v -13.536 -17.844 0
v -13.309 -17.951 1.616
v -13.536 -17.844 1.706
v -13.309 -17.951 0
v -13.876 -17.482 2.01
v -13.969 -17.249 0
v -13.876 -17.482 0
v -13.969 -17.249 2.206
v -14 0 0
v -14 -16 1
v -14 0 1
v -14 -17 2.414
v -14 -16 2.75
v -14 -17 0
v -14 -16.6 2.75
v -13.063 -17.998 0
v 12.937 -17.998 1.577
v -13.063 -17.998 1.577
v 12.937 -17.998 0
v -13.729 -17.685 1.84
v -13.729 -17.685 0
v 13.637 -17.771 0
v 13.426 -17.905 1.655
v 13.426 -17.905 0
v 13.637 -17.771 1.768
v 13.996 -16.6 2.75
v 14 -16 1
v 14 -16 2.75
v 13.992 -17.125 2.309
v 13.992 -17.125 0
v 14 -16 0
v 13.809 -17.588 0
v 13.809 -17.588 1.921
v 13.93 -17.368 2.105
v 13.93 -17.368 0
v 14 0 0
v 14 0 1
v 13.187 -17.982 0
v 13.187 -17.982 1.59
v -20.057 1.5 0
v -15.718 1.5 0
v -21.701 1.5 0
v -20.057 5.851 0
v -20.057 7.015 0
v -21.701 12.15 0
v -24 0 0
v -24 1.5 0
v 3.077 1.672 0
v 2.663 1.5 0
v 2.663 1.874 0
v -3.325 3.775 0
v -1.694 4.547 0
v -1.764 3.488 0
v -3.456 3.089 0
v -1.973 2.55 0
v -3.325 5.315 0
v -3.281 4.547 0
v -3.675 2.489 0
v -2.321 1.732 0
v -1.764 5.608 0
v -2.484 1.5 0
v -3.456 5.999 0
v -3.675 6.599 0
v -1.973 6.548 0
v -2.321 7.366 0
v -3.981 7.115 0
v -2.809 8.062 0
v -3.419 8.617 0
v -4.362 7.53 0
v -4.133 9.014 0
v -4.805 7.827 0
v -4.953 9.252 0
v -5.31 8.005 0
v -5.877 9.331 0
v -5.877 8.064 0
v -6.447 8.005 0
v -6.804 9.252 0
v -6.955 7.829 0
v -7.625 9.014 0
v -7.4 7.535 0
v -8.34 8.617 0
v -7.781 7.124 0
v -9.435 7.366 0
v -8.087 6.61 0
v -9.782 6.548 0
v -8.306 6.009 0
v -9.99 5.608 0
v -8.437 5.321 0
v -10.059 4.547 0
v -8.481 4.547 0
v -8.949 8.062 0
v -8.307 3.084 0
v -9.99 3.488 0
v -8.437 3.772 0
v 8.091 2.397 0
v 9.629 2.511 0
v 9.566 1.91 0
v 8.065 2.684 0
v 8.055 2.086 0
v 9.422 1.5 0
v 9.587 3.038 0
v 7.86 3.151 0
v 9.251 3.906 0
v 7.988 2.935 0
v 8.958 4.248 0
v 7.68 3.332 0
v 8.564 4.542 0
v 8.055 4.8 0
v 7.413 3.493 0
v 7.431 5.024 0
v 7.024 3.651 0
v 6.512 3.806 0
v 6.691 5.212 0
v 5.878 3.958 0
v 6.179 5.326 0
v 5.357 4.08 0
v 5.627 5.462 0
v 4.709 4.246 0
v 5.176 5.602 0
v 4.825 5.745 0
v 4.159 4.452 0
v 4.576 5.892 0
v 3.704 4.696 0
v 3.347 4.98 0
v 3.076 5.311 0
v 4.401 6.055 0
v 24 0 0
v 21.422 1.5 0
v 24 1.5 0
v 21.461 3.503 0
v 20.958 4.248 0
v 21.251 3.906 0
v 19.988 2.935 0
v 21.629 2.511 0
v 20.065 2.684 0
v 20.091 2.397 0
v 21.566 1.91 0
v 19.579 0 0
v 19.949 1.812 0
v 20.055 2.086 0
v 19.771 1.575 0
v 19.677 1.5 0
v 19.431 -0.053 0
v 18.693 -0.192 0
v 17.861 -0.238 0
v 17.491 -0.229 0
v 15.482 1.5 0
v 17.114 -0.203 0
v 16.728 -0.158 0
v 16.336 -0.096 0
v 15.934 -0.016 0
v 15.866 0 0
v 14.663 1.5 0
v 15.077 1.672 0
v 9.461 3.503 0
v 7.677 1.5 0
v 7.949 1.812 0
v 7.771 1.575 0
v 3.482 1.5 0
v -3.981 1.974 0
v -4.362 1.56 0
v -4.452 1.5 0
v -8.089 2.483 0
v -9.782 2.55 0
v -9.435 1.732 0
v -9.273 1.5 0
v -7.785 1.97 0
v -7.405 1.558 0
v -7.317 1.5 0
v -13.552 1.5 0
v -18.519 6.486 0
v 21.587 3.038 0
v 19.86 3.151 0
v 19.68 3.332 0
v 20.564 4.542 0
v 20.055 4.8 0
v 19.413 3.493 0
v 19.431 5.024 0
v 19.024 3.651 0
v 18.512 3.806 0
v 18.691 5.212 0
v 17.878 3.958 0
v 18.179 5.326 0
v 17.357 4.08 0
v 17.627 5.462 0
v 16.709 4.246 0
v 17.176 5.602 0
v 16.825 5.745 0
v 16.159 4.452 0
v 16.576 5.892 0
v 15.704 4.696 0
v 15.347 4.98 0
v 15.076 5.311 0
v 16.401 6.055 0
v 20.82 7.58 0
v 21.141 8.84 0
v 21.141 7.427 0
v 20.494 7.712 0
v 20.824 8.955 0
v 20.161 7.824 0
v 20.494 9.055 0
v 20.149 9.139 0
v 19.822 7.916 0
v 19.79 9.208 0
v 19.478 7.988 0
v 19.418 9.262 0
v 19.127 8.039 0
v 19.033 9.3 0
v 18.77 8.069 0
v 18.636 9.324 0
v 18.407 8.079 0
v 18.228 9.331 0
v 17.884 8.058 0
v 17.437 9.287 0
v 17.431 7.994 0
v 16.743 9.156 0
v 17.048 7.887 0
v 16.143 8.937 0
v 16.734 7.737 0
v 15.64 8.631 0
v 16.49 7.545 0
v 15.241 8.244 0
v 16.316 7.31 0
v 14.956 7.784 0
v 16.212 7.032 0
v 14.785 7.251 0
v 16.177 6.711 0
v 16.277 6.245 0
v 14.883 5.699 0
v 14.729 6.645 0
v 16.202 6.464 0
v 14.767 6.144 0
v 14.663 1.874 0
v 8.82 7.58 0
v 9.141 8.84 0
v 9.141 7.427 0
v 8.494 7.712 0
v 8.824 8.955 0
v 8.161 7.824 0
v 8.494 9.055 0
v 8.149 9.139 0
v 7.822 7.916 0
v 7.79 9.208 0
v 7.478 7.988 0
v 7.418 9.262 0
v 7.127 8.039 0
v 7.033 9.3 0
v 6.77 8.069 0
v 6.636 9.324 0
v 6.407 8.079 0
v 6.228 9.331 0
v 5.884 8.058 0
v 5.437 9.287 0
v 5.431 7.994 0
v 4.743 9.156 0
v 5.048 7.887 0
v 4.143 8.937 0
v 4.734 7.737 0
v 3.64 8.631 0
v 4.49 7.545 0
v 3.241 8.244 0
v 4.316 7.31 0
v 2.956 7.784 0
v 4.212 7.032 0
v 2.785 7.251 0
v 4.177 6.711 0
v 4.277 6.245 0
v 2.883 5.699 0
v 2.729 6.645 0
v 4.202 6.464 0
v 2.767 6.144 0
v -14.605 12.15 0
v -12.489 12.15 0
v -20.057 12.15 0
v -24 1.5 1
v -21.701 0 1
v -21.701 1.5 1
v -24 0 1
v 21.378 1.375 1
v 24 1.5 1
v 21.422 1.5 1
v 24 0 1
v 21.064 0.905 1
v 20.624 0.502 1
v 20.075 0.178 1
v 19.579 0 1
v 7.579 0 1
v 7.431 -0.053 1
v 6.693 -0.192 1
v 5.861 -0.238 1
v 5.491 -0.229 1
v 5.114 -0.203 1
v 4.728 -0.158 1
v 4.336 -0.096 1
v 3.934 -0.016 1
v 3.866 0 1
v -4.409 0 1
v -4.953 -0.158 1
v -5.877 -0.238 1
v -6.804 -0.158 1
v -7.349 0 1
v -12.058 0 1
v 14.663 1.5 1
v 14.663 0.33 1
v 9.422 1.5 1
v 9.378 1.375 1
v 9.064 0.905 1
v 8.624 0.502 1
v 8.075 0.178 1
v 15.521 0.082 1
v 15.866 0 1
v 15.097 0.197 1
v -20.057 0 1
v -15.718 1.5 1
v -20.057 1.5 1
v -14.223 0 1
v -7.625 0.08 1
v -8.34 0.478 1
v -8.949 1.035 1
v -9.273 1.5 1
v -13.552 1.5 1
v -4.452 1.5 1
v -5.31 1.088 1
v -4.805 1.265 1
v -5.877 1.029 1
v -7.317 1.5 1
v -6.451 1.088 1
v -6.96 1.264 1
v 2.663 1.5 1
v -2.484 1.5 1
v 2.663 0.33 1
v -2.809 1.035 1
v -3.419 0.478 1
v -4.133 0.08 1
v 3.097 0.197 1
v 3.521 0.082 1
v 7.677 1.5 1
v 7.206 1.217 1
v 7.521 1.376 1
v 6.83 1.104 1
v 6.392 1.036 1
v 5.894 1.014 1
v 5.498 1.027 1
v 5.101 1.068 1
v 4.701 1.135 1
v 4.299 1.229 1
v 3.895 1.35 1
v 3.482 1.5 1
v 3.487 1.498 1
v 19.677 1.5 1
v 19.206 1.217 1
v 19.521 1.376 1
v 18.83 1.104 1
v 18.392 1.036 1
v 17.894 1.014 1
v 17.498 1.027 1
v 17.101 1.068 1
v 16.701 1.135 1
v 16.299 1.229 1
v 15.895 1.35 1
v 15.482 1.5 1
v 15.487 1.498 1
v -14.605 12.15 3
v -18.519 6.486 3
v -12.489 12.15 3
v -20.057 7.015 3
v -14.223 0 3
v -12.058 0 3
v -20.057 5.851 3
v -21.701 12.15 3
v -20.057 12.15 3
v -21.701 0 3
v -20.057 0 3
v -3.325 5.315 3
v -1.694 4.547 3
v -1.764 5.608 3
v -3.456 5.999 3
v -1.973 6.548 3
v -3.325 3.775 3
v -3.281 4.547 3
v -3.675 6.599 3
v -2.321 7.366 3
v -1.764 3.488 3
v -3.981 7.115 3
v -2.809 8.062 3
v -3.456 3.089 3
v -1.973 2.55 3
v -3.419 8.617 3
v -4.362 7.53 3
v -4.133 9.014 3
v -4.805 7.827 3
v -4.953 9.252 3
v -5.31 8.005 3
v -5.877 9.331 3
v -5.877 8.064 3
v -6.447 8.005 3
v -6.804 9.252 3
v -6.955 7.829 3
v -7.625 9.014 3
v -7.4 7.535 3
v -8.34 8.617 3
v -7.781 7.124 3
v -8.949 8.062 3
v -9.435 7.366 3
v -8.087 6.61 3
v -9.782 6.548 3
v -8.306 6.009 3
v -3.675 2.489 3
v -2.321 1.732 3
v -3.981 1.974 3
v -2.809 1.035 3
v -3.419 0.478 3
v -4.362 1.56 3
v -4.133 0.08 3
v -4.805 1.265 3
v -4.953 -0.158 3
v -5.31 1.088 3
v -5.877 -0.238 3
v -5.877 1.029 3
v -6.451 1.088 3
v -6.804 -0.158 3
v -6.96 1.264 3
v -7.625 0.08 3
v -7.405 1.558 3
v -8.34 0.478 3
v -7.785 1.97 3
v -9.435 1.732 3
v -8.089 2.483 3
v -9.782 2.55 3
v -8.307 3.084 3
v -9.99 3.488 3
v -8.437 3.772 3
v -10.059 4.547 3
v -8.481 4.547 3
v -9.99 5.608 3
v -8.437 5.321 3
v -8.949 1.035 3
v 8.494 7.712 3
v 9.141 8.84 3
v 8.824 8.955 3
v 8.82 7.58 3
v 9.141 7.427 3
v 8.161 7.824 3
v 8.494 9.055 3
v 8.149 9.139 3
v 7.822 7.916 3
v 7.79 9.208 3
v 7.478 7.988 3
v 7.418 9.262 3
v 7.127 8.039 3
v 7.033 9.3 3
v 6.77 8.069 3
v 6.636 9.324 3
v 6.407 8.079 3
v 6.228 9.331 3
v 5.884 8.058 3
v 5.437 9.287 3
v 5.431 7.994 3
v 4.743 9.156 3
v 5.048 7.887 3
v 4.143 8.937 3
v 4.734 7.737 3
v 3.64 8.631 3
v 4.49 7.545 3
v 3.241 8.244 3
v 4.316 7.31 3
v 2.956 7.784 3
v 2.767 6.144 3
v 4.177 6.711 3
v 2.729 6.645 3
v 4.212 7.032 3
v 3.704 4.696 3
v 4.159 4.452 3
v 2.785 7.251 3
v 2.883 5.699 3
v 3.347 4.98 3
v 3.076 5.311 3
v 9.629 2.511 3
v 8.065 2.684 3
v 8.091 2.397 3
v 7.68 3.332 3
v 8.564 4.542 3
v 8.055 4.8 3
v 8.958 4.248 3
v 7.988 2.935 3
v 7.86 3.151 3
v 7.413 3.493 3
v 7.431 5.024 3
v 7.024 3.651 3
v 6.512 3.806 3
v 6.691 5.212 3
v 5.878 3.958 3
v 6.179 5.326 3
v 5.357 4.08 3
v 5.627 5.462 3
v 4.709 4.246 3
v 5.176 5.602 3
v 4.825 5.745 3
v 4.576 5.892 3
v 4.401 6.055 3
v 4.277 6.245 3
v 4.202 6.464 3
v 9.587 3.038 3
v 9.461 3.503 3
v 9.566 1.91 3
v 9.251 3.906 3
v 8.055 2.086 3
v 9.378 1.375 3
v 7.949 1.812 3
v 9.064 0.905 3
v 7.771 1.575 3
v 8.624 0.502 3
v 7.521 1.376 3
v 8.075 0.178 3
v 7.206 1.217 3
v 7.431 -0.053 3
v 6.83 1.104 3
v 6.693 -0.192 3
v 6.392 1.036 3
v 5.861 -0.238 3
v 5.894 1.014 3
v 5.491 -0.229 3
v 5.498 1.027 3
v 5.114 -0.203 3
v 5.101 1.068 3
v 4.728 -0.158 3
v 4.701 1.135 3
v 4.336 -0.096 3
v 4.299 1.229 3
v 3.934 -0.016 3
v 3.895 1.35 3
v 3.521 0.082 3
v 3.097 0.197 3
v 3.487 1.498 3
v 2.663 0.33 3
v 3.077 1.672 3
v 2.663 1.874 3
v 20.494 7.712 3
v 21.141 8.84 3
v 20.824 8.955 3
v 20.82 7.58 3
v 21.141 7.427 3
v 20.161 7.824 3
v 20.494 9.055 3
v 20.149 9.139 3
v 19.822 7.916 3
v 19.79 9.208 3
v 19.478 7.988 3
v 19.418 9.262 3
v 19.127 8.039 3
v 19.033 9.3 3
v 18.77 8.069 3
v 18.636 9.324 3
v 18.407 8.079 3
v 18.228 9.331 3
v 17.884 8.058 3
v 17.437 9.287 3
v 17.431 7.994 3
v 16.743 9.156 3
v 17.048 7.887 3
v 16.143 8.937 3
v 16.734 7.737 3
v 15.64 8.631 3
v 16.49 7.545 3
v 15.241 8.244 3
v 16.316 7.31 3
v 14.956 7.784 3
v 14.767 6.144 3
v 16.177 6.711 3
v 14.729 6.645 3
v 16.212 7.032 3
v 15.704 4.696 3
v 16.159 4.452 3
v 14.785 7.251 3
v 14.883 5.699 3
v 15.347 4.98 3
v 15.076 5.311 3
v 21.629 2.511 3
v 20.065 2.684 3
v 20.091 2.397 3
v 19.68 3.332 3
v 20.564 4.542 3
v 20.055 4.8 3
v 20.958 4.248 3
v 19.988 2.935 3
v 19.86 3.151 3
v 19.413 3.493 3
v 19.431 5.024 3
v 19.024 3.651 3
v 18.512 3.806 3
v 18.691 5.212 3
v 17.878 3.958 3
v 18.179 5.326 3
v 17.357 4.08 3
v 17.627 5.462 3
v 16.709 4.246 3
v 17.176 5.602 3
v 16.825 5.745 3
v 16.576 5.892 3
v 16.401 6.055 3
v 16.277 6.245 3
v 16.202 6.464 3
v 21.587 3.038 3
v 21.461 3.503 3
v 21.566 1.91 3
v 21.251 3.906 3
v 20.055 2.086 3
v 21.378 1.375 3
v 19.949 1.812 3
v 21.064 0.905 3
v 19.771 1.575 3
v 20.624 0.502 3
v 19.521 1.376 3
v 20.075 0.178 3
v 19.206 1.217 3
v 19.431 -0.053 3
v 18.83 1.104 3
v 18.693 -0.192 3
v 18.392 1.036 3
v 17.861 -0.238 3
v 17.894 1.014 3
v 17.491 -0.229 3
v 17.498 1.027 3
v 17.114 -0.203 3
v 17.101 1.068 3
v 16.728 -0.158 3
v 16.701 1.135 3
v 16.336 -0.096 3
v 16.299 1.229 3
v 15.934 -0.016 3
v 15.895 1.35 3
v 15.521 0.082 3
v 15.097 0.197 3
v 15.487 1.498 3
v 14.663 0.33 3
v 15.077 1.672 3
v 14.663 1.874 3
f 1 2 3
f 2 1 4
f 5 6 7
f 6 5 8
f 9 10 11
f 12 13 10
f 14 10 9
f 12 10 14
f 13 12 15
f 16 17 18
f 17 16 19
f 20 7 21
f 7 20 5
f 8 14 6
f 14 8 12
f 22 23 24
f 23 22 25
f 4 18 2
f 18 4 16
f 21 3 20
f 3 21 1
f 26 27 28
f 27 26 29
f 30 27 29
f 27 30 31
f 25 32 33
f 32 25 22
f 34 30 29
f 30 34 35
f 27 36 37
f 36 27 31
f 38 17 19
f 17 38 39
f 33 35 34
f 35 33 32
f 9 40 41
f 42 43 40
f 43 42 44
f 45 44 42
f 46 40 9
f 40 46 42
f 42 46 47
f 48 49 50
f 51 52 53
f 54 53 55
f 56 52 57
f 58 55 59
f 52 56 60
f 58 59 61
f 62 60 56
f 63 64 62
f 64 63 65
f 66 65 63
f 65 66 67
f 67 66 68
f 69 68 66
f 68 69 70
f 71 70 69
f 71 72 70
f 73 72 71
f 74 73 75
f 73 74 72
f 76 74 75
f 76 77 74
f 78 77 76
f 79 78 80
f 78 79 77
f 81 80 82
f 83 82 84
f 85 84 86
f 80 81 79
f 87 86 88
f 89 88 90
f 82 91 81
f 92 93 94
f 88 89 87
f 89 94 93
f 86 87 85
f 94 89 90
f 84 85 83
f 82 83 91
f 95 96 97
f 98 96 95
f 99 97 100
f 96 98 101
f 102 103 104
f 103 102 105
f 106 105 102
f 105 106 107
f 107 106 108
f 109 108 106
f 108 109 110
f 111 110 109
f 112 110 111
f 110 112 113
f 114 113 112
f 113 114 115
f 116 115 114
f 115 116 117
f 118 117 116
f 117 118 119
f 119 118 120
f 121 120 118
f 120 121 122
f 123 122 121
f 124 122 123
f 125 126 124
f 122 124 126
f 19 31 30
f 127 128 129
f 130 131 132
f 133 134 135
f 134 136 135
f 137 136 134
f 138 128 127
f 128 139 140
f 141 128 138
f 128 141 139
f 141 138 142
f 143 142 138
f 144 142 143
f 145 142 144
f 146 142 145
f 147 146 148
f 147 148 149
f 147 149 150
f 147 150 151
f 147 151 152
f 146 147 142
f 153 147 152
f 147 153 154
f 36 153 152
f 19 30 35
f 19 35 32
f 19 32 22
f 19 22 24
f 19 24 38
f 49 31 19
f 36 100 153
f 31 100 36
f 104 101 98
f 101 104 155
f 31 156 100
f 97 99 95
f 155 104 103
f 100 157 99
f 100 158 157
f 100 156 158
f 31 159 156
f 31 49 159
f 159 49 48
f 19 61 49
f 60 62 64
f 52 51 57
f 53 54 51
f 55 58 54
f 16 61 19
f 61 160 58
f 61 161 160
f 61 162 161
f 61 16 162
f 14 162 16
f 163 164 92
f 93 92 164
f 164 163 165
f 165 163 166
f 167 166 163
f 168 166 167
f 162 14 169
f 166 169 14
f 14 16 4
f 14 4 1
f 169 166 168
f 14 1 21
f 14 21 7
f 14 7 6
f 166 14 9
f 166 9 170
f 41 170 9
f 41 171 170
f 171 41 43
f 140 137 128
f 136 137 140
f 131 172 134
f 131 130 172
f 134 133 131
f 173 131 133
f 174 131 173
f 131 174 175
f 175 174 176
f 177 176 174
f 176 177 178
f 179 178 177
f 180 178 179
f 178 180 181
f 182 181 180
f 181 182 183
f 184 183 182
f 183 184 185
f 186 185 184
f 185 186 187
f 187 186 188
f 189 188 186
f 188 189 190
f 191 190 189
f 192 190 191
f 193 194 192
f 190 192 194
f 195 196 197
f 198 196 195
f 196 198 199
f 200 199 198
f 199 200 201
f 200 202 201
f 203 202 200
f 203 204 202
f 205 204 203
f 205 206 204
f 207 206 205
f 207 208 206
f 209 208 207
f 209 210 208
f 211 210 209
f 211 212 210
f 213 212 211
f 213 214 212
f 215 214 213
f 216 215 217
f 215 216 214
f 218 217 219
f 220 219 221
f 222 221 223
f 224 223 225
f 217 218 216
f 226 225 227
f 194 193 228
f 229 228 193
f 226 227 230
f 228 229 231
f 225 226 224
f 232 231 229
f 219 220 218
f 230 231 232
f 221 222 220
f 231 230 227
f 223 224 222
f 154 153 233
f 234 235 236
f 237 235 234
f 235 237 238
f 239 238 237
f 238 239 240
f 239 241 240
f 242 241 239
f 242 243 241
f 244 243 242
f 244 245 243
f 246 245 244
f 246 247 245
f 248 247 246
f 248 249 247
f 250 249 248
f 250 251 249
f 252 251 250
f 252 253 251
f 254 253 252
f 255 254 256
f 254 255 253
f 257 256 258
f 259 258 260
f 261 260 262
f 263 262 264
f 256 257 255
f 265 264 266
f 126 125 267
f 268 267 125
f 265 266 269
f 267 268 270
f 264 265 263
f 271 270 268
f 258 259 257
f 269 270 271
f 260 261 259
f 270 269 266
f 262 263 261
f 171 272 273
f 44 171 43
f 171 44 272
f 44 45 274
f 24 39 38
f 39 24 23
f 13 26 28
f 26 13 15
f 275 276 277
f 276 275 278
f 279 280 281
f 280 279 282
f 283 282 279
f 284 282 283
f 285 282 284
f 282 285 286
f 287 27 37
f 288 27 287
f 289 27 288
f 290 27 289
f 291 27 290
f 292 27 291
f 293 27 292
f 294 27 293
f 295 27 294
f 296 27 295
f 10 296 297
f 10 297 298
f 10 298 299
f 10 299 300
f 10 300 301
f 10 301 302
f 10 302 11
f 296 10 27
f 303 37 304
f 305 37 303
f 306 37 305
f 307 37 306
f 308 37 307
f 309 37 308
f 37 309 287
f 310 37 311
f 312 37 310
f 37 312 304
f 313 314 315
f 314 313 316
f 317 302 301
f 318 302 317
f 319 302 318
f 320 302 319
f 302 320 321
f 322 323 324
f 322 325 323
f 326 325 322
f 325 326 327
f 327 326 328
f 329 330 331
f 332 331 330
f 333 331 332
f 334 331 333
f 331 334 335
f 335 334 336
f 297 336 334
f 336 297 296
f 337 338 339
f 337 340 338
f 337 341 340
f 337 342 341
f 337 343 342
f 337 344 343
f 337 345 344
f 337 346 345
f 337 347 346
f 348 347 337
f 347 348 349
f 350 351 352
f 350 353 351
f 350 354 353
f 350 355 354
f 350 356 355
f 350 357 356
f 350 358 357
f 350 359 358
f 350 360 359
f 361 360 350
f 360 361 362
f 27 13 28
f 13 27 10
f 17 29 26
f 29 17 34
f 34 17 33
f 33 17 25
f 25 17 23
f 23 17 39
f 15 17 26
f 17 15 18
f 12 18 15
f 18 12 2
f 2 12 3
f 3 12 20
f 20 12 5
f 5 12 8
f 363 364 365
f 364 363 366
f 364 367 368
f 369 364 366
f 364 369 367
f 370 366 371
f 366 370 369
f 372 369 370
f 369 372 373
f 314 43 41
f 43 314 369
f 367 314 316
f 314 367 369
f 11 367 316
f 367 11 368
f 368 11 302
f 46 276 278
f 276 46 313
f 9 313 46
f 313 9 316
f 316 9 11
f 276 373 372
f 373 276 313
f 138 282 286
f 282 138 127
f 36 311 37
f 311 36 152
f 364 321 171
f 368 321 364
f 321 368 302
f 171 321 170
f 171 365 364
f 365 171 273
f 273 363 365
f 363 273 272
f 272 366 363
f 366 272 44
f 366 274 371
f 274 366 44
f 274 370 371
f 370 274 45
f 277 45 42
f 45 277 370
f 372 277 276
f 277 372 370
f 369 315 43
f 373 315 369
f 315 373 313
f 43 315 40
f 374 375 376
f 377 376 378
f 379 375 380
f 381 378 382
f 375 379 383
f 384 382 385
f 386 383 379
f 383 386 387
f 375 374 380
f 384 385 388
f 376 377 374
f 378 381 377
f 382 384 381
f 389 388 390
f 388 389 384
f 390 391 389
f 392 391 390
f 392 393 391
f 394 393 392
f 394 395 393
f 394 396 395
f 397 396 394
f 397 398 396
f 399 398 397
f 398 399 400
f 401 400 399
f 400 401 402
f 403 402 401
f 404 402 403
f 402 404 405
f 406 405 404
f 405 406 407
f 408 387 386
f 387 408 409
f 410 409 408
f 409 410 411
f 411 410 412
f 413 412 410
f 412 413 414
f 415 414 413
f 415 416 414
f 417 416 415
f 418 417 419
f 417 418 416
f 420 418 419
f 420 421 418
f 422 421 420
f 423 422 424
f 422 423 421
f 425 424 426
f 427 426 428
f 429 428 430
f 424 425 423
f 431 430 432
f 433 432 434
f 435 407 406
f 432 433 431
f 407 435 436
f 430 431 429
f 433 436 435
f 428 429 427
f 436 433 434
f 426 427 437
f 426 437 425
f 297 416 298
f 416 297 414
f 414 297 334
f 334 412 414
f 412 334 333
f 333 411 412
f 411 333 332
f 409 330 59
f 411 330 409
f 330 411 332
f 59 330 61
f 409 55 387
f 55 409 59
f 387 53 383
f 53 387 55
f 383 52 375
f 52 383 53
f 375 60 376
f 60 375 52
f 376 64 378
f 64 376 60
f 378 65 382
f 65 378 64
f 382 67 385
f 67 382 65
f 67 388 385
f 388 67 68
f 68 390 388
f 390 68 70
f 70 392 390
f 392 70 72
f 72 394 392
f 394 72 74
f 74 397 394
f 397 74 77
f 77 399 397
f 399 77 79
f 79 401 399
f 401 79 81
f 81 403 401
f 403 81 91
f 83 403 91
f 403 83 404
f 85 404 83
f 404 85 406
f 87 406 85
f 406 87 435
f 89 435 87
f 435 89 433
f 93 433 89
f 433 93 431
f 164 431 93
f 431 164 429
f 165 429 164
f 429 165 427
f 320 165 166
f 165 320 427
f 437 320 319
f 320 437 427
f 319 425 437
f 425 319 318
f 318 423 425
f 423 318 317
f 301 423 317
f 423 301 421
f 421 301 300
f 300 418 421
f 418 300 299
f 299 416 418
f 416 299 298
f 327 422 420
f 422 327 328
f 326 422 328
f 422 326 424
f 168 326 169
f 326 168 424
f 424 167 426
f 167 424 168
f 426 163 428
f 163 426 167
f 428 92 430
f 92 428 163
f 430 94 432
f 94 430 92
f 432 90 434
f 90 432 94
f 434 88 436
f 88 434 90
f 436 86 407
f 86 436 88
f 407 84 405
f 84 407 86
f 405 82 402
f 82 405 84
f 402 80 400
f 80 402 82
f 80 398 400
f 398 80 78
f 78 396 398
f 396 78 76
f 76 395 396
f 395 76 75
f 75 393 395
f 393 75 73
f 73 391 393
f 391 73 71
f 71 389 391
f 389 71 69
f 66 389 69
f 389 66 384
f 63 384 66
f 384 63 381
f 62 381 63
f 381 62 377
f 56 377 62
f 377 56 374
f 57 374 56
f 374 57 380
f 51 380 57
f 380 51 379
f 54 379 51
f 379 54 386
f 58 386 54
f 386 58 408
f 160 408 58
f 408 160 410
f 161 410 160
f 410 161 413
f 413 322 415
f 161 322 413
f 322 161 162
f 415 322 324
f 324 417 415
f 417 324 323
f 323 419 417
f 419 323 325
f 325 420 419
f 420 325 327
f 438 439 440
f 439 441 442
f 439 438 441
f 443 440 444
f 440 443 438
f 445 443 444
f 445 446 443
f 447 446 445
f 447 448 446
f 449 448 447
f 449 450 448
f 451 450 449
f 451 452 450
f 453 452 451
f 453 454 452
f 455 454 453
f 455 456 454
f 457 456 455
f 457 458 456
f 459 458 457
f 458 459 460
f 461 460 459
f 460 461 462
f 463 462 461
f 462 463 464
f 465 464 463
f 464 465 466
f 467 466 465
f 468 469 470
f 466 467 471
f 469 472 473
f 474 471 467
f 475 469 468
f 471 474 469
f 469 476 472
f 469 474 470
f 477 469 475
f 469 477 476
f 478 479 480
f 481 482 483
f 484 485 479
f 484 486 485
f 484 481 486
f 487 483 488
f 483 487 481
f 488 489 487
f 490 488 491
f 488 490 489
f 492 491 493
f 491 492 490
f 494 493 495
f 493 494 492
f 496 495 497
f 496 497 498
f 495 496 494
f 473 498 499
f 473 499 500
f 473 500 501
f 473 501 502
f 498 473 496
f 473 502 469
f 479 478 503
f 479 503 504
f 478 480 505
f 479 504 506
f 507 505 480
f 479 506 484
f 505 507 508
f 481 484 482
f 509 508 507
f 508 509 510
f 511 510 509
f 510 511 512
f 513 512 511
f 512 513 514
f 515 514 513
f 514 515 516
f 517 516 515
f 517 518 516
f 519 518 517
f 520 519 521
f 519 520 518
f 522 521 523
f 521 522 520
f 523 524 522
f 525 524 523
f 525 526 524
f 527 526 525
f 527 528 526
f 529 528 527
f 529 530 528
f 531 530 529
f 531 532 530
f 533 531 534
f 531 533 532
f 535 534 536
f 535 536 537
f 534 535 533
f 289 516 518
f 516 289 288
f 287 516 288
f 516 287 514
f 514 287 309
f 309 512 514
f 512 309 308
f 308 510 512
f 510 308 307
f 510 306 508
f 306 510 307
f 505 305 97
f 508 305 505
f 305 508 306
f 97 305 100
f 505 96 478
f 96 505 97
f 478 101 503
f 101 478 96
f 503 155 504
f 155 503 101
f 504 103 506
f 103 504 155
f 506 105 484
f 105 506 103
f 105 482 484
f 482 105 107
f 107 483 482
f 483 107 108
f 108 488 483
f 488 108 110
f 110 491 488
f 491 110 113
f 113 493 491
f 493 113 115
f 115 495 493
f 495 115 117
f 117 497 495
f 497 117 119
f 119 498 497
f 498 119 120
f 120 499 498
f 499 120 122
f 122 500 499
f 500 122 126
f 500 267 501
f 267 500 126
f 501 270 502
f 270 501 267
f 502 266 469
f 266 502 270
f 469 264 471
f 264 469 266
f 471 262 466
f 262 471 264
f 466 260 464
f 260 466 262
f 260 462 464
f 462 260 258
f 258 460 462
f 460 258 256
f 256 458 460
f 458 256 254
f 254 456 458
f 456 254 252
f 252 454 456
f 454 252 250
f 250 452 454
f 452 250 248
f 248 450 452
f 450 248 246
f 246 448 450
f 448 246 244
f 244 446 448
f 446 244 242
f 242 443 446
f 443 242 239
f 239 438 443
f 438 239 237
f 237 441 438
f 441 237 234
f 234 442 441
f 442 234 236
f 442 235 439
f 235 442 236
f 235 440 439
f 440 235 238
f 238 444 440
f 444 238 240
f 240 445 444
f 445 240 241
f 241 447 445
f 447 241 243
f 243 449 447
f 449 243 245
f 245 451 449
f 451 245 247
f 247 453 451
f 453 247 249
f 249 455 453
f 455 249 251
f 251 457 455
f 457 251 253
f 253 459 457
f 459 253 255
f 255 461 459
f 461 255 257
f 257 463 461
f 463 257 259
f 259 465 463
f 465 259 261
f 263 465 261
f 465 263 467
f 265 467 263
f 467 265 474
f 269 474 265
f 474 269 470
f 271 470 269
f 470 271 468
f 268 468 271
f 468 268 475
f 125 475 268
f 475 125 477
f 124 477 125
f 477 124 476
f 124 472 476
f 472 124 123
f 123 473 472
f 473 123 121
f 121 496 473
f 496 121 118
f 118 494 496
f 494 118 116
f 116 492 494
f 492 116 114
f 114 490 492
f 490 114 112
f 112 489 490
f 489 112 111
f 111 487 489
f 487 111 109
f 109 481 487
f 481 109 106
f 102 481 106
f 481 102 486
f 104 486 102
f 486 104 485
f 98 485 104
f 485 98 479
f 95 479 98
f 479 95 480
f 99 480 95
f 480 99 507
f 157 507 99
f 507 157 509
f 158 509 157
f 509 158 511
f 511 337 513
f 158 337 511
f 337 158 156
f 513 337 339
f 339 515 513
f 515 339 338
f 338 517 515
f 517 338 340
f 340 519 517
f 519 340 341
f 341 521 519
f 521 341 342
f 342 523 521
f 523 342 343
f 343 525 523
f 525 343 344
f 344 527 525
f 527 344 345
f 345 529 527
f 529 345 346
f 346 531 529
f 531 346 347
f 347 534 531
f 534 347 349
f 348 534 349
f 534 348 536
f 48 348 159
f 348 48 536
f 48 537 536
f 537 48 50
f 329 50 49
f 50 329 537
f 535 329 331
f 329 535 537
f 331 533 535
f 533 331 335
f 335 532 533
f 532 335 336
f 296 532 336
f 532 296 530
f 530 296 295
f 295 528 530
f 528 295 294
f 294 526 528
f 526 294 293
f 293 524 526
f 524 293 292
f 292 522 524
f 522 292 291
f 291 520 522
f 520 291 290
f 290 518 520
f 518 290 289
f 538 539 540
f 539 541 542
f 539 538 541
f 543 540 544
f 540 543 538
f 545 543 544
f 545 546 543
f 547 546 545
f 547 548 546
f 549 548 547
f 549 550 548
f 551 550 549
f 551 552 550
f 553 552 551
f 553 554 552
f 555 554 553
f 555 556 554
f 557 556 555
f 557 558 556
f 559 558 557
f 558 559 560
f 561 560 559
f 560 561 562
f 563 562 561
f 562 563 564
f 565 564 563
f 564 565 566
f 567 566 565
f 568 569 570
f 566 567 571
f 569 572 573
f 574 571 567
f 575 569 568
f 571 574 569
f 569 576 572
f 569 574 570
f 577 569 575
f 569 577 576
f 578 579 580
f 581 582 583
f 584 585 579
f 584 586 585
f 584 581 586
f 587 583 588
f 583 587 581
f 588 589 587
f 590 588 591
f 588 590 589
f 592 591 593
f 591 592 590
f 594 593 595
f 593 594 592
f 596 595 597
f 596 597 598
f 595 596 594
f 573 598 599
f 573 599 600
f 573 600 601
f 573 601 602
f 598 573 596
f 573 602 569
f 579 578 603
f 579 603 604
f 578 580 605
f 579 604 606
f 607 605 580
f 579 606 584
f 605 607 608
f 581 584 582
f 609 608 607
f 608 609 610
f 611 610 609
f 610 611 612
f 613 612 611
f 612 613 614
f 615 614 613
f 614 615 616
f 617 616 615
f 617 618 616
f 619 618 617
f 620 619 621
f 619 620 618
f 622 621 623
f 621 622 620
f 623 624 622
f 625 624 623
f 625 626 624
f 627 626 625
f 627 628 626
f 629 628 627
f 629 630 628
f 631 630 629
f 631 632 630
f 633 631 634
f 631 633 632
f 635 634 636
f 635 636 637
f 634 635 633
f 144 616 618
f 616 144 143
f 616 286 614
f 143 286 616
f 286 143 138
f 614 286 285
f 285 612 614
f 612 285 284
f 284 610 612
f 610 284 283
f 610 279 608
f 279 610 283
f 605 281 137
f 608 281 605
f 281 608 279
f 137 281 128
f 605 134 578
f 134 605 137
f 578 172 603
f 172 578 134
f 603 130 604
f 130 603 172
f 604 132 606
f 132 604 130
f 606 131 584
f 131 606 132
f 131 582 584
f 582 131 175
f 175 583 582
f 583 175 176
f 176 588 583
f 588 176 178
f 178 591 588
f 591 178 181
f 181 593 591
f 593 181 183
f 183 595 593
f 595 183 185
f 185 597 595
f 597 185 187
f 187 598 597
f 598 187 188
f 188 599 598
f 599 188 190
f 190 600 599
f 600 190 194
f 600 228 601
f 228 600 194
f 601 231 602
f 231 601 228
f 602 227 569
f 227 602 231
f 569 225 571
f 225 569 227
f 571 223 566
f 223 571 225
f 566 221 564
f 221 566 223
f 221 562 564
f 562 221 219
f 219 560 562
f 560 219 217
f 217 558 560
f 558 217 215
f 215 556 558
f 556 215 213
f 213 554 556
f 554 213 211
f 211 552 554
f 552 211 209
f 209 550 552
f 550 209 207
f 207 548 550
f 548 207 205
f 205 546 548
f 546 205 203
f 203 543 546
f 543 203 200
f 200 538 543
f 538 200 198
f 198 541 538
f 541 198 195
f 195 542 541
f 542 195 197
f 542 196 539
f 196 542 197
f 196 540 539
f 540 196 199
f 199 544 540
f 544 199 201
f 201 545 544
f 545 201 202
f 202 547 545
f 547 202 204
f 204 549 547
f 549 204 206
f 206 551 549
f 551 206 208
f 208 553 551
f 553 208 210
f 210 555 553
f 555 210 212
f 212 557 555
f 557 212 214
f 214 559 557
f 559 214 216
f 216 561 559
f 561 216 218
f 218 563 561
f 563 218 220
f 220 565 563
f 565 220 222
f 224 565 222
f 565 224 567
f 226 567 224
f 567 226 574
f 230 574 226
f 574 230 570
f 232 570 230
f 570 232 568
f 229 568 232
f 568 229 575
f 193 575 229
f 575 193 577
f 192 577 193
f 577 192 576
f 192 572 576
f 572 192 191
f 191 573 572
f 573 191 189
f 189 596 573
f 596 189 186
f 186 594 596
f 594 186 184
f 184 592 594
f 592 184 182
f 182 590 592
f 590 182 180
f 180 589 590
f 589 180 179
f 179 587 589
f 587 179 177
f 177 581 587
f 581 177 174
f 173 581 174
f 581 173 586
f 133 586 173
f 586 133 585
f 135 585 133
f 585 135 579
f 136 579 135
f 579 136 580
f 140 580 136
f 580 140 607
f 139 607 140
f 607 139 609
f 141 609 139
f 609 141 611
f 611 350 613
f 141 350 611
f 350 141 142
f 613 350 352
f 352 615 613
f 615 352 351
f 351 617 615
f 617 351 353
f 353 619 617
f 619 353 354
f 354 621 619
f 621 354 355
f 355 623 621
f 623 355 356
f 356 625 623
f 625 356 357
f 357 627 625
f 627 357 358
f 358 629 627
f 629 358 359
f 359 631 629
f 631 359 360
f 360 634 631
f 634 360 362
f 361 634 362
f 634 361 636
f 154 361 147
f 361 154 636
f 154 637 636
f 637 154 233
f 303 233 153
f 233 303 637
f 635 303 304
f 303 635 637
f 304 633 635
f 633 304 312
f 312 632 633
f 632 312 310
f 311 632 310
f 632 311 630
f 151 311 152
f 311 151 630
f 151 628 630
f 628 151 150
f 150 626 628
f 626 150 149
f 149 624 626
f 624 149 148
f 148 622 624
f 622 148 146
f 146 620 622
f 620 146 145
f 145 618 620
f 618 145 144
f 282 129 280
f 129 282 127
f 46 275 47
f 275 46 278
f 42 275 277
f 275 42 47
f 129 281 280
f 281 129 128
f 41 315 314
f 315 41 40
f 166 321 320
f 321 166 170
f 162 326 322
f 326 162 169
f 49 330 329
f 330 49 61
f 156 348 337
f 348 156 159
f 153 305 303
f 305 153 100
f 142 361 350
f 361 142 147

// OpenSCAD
//Hardhat accessory slot tab
//Writen by Dan Koss 1/2016. (Updated 1/23/16)
//Thanks to MC Geisler (thing:714444) for the font list. I'm still figuring out text and will trim don the list as I learn.
//Choose to import STL or Use custom text

/* [Add Text] */
//Text Line 1
line1 = "";
//Text Line 2
line2 = "";
//Text Line 3
line3 = "";
//Text Line 4
line4 = "Koss";

//Font name, e.g. "Libration Sans", "Aldo", depends on what is available on the platform. In the customizer,choose from about 700 Google Fonts. For an overview please refer: http://www.google.com/fonts
FontName="Electrolize"; //[ABeeZee,Abel,Abril Fatface,Aclonica,Acme,Actor,Adamina,Advent Pro,Aguafina Script,Akronim,Aladin,Aldrich,Alef,Alegreya,Alegreya Sans,Alegreya Sans SC,Alegreya SC,Alex Brush,Alfa Slab One,Alice,Alike,Alike Angular,Allan,Allerta,Allerta Stencil,Allura,Almendra,Almendra Display,Almendra SC,Amarante,Amaranth,Amatic SC,Amethysta,Amiri,Anaheim,Andada,Andika,Angkor,Annie Use Your Telescope,Anonymous Pro,Antic,Antic Didone,Antic Slab,Anton,Arapey,Arbutus,Arbutus Slab,Architects Daughter,Archivo Black,Archivo Narrow,Arimo,Arizonia,Armata,Artifika,Arvo,Asap,Asset,Astloch,Asul,Atomic Age,Aubrey,Audiowide,Autour One,Average,Average Sans,Averia Gruesa Libre,Averia Libre,Averia Sans Libre,Averia Serif Libre,Bad Script,Balthazar,Bangers,Basic,Battambang,Baumans,Bayon,Belgrano,Belleza,BenchNine,Bentham,Berkshire Swash,Bevan,Bigelow Rules,Bigshot One,Bilbo,Bilbo Swash Caps,Bitter,Black Ops One,Bokor,Bonbon,Boogaloo,Bowlby One,Bowlby One SC,Brawler,Bree Serif,Bubblegum Sans,Bubbler One,Buda,Buenard,Butcherman,Butterfly Kids,Cabin,Cabin Condensed,Cabin Sketch,Caesar Dressing,Cagliostro,Calligraffitti,Cambay,Cambo,Candal,Cantarell,Cantata One,Cantora One,Capriola,Cardo,Carme,Carrois Gothic,Carrois Gothic SC,Carter One,Caudex,Cedarville Cursive,Ceviche One,Changa One,Chango,Chau Philomene One,Chela One,Chelsea Market,Chenla,Cherry Cream Soda,Cherry Swash,Chewy,Chicle,Chivo,Cinzel,Cinzel Decorative,Clicker Script,Coda,Coda Caption,Codystar,Combo,Comfortaa,Coming Soon,Concert One,Condiment,Content,Contrail One,Convergence,Cookie,Copse,Corben,Courgette,Cousine,Coustard,Covered By Your Grace,Crafty Girls,Creepster,Crete Round,Crimson Text,Croissant One,Crushed,Cuprum,Cutive,Cutive Mono,Damion,Dancing Script,Dangrek,Dawning of a New Day,Days One,Dekko,Delius,Delius Swash Caps,Delius Unicase,Della Respira,Denk One,Devonshire,Dhurjati,Didact Gothic,Diplomata,Diplomata SC,Domine,Donegal One,Doppio One,Dorsa,Dosis,Dr Sugiyama,Droid Sans,Droid Sans Mono,Droid Serif,Duru Sans,Dynalight,Eagle Lake,Eater,EB Garamond,Economica,Ek Mukta,Electrolize,Elsie,Elsie Swash Caps,Emblema One,Emilys Candy,Engagement,Englebert,Enriqueta,Erica One,Esteban,Euphoria Script,Ewert,Exo,Exo 2,Expletus Sans,Fanwood Text,Fascinate,Fascinate Inline,Faster One,Fasthand,Fauna One,Federant,Federo,Felipa,Fenix,Finger Paint,Fira Mono,Fira Sans,Fjalla One,Fjord One,Flamenco,Flavors,Fondamento,Fontdiner Swanky,Forum,Francois One,Freckle Face,Fredericka the Great,Fredoka One,Freehand,Fresca,Frijole,Fruktur,Fugaz One,Gabriela,Gafata,Galdeano,Galindo,Gentium Basic,Gentium Book Basic,Geo,Geostar,Geostar Fill,Germania One,GFS Didot,GFS Neohellenic,Gidugu,Gilda Display,Give You Glory,Glass Antiqua,Glegoo,Gloria Hallelujah,Goblin One,Gochi Hand,Gorditas,Goudy Bookletter 1911,Graduate,Grand Hotel,Gravitas One,Great Vibes,Griffy,Gruppo,Gudea,Gurajada,Habibi,Halant,Hammersmith One,Hanalei,Hanalei Fill,Handlee,Hanuman,Happy Monkey,Headland One,Henny Penny,Herr Von Muellerhoff,Hind,Holtwood One SC,Homemade Apple,Homenaje,Iceberg,Iceland,IM Fell Double Pica,IM Fell Double Pica SC,IM Fell DW Pica,IM Fell DW Pica SC,IM Fell English,IM Fell English SC,IM Fell French Canon,IM Fell French Canon SC,IM Fell Great Primer,IM Fell Great Primer SC,Imprima,Inconsolata,Inder,Indie Flower,Inika,Irish Grover,Istok Web,Italiana,Italianno,Jacques Francois,Jacques Francois Shadow,Jim Nightshade,Jockey One,Jolly Lodger,Josefin Sans,Josefin Slab,Joti One,Judson,Julee,Julius Sans One,Junge,Jura,Just Another Hand,Just Me Again Down Here,Kalam,Kameron,Kantumruy,Karla,Karma,Kaushan Script,Kavoon,Kdam Thmor,Keania One,Kelly Slab,Kenia,Khand,Khmer,Khula,Kite One,Knewave,Kotta One,Koulen,Kranky,Kreon,Kristi,Krona One,La Belle Aurore,Laila,Lakki Reddy,Lancelot,Lateef,Lato,League Script,Leckerli One,Ledger,Lekton,Lemon,Liberation Sans,Libre Baskerville,Life Savers,Lilita One,Lily Script One,Limelight,Linden Hill,Lobster,Lobster Two,Londrina Outline,Londrina Shadow,Londrina Sketch,Londrina Solid,Lora,Love Ya Like A Sister,Loved by the King,Lovers Quarrel,Luckiest Guy,Lusitana,Lustria,Macondo,Macondo Swash Caps,Magra,Maiden Orange,Mako,Mallanna,Mandali,Marcellus,Marcellus SC,Marck Script,Margarine,Marko One,Marmelad,Martel Sans,Marvel,Mate,Mate SC,Maven Pro,McLaren,Meddon,MedievalSharp,Medula One,Megrim,Meie Script,Merienda,Merienda One,Merriweather,Merriweather Sans,Metal,Metal Mania,Metamorphous,Metrophobic,Michroma,Milonga,Miltonian,Miltonian Tattoo,Miniver,Miss Fajardose,Modak,Modern Antiqua,Molengo,Molle,Monda,Monofett,Monoton,Monsieur La Doulaise,Montaga,Montez,Montserrat,Montserrat Alternates,Montserrat Subrayada,Moul,Moulpali,Mountains of Christmas,Mouse Memoirs,Mr Bedfort,Mr Dafoe,Mr De Haviland,Mrs Saint Delafield,Mrs Sheppards,Muli,Mystery Quest,Neucha,Neuton,New Rocker,News Cycle,Niconne,Nixie One,Nobile,Nokora,Norican,Nosifer,Nothing You Could Do,Noticia Text,Noto Sans,Noto Serif,Nova Cut,Nova Flat,Nova Mono,Nova Oval,Nova Round,Nova Script,Nova Slim,Nova Square,NTR,Numans,Nunito,Odor Mean Chey,Offside,Old Standard TT,Oldenburg,Oleo Script,Oleo Script Swash Caps,Open Sans,Open Sans Condensed,Oranienbaum,Orbitron,Oregano,Orienta,Original Surfer,Oswald,Over the Rainbow,Overlock,Overlock SC,Ovo,Oxygen,Oxygen Mono,Pacifico,Paprika,Parisienne,Passero One,Passion One,Pathway Gothic One,Patrick Hand,Patrick Hand SC,Patua One,Paytone One,Peddana,Peralta,Permanent Marker,Petit Formal Script,Petrona,Philosopher,Piedra,Pinyon Script,Pirata One,Plaster,Play,Playball,Playfair Display,Playfair Display SC,Podkova,Poiret One,Poller One,Poly,Pompiere,Pontano Sans,Port Lligat Sans,Port Lligat Slab,Prata,Preahvihear,Press Start 2P,Princess Sofia,Prociono,Prosto One,PT Mono,PT Sans,PT Sans Caption,PT Sans Narrow,PT Serif,PT Serif Caption,Puritan,Purple Purse,Quando,Quantico,Quattrocento,Quattrocento Sans,Questrial,Quicksand,Quintessential,Qwigley,Racing Sans One,Radley,Rajdhani,Raleway,Raleway Dots,Ramabhadra,Ramaraja,Rambla,Rammetto One,Ranchers,Rancho,Ranga,Rationale,Ravi Prakash,Redressed,Reenie Beanie,Revalia,Ribeye,Ribeye Marrow,Righteous,Risque,Roboto,Roboto Condensed,Roboto Slab,Rochester,Rock Salt,Rokkitt,Romanesco,Ropa Sans,Rosario,Rosarivo,Rouge Script,Rozha One,Rubik Mono One,Rubik One,Ruda,Rufina,Ruge Boogie,Ruluko,Rum Raisin,Ruslan Display,Russo One,Ruthie,Rye,Sacramento,Sail,Salsa,Sanchez,Sancreek,Sansita One,Sarina,Sarpanch,Satisfy,Scada,Scheherazade,Schoolbell,Seaweed Script,Sevillana,Seymour One,Shadows Into Light,Shadows Into Light Two,Shanti,Share,Share Tech,Share Tech Mono,Shojumaru,Short Stack,Siemreap,Sigmar One,Signika,Signika Negative,Simonetta,Sintony,Sirin Stencil,Six Caps,Skranji,Slabo 13px,Slabo 27px,Slackey,Smokum,Smythe,Sniglet,Snippet,Snowburst One,Sofadi One,Sofia,Sonsie One,Sorts Mill Goudy,Source Code Pro,Source Sans Pro,Source Serif Pro,Special Elite,Spicy Rice,Spinnaker,Spirax,Squada One,Sree Krushnadevaraya,Stalemate,Stalinist One,Stardos Stencil,Stint Ultra Condensed,Stint Ultra Expanded,Stoke,Strait,Sue Ellen Francisco,Sunshiney,Supermercado One,Suranna,Suravaram,Suwannaphum,Swanky and Moo Moo,Syncopate,Tangerine,Taprom,Tauri,Teko,Telex,Tenali Ramakrishna,Tenor Sans,Text Me One,The Girl Next Door,Tienne,Timmana,Tinos,Titan One,Titillium Web,Trade Winds,Trocchi,Trochut,Trykker,Tulpen One,Ubuntu,Ubuntu Condensed,Ubuntu Mono,Ultra,Uncial Antiqua,Underdog,Unica One,UnifrakturCook,UnifrakturMaguntia,Unkempt,Unlock,Unna,Vampiro One,Varela,Varela Round,Vast Shadow,Vesper Libre,Vibur,Vidaloka,Viga,Voces,Volkhov,Vollkorn,Voltaire,VT323,Waiting for the Sunrise,Wallpoet,Walter Turncoat,Warnes,Wellfleet,Wendy One,Wire One,Yanone Kaffeesatz,Yellowtail,Yeseva One,Yesteryear,Zeyada]
//Font Size
FontSize = 12; //[1:.5:30]
//Font Spacing
FontSpace = 1.0; //[0:.1:2]
//Font Extrusion;
FontExtrude = 3; //[1:.1:10]
//Line Spacing
LineSpace = 1.1; //[0:.1:2]


/* [Hidden] */
stlortext = "text";

//The following is to import an STL File. Change "stlortext" to ="stl"
//and copy the STL file to the same folder as your .scad file
stlfile = "koss_insert.stl";
//Shift STL [x,y,z]
stlshift = [0,9,0];
//Scale STL [x,y,z] axis
stlscale = [1,1,1];
//Rotate STL about [x,y,z] axis
stlrotate = [0,0,0];

/* [Hidden] */
//Referenced constants for the TAB.
//Tshiftx = 15;
tabX = 28;
tabY = 16;
tabZ = 2.75;
tabHead = 1;
tabClip = 2;
rad=tabClip/2;

if (stlortext == "stl") {
    union(){
        translate([stlshift[0],stlshift[1],stlshift[2]]) scale([stlscale[0],stlscale[1],stlscale[2]]) rotate([stlrotate[0],stlrotate[1],stlrotate[2]]) import(stlfile);
        TAB();
    }
}
else if (stlortext == "text") {TextClip();}
else echo("error");


//
//Add Text. Line 4 at bottom and Line 1 at the Top
module TextClip (){
    union(){
        TAB();
        len_text = len(line4);
        translate([-((len_text)/2)*FontSize*FontSpace,0,0]) WriteText(line4,FontSize);
        translate([-((len_text)/2)*FontSize*FontSpace,0,0]) cube([(len_text)*FontSize*FontSpace,1.5,1]);
        
        if (line3 != "") {
            len_text = len(line3);
            translate([-((len_text)/2)*FontSize*FontSpace,FontSize*LineSpace,0]) WriteText(line3,FontSize);
            translate([-((len_text)/2)*FontSize*FontSpace,FontSize*LineSpace-1,0]) cube([(len_text)*FontSize*FontSpace,1.5+1+(FontSize*(LineSpace-1)),1]);
        }
        
        if (line2 != "") {
            len_text = len(line2);
            translate([-((len_text)/2)*FontSize*FontSpace,2*FontSize*LineSpace,0]) WriteText(line2, FontSize);
            translate([-((len_text)/2)*FontSize*FontSpace,2*(FontSize*LineSpace-1),0]) cube([(len_text)*FontSize*FontSpace,1.5+1+(FontSize*(LineSpace-1)),1]);
        }
        
        if (line1 != "") {
            len_text = len(line1);
            translate([-((len_text)/2)*FontSize*FontSpace,3*FontSize*LineSpace,0]) WriteText(line1,FontSize);
            translate([-((len_text)/2)*FontSize*FontSpace,3*(FontSize*LineSpace-1),0]) cube([(len_text)*FontSize*FontSpace,1.5+1+(FontSize*(LineSpace-1)),1]);
        }
    }
}


module WriteText (textstring, fontsize){
    len_text = len(textstring);
    for (i=[0:1:(len_text-1)]) {
        if(textstring[i]=="i"){
            translate([((i+.5)*FontSpace*FontSize),0,0]) HighDots(textstring[i]);
        }
        else if(textstring[i]=="j"){
            translate([((i+.5)*FontSpace*FontSize),0,0]) HighDots(textstring[i]);
        }
        else if(textstring[i]=="?"){
            translate([((i+.5)*FontSpace*FontSize),0,0]) LowDots(textstring[i]);
        }
        else if(textstring[i]=="!"){
            translate([((i+.5)*FontSpace*FontSize),0,0]) LowDots(textstring[i]);
        }
        else if(textstring[i]==":"){
            translate([((i+.5)*FontSpace*FontSize),0,0]) LowDots(textstring[i]);
        }
        else if(textstring[i]==";"){
            translate([((i+.5)*FontSpace*FontSize),0,0]) LowDots(textstring[i]);
        }
        else {
            translate([((i+.5)*FontSpace*FontSize),0,0]) {
            linear_extrude(height=FontExtrude,convexity=10)
                text(textstring[i],size=FontSize,font=FontName,halign="center",valign="baseline");
            }
        }
    }
}
module HighDots(letter){
     union(){
         translate([0,0,0]) hull(){
             difference(){
                linear_extrude(1) text(letter,size=FontSize,font=FontName,halign="center",valign="baseline");
                translate([-FontSize/2,-(FontSize)/3,-0.5]) cube([FontSize,FontSize,2]);
             }
         }
         linear_extrude(height=FontExtrude,convexity=10)
            text(letter,size=FontSize,font=FontName,halign="center",valign="baseline");
        }
}
 module LowDots(letter){
     union(){
         translate([0,0,0]) hull(){
             difference(){
                 linear_extrude(1) text(letter,size=FontSize,font=FontName,halign="center",valign="baseline");
                 translate([-FontSize/2,FontSize/3,-0.5]) cube([FontSize,FontSize,2]);
             }
         }
         linear_extrude(height=FontExtrude,convexity=10)
            text(letter,size=FontSize,font=FontName,halign="center",valign="baseline");
        }
}
 
//
//Draw the tab.
module TAB (){
    rotate([0,0,180]) difference(){
        hull(){ //outer shell
            translate([-tabX/2,0,0]) cube([tabX,tabY,tabZ]);
            translate([-tabX/2,-tabHead,0]) cube([tabX,tabHead,tabZ]);
            translate([-((tabX/2)-rad),tabY+tabClip-rad,0]) cylinder(h=tabZ, r=rad, $fn=25);
            translate([((tabX/2)-rad),tabY+tabClip-rad,0]) cylinder(h=tabZ, r=rad, $fn=25);
        }
        translate([-(tabX*1.1)/2,-tabHead-.1,1]) cube(size=[tabX*1.1,tabY+tabHead+.1,tabZ]);
        translate([-(tabX*1.1)/2,tabY+(0.3*tabClip),tabZ]) rotate([-40,0,0]) cube([tabX*1.1,10,5]);
    }
}
